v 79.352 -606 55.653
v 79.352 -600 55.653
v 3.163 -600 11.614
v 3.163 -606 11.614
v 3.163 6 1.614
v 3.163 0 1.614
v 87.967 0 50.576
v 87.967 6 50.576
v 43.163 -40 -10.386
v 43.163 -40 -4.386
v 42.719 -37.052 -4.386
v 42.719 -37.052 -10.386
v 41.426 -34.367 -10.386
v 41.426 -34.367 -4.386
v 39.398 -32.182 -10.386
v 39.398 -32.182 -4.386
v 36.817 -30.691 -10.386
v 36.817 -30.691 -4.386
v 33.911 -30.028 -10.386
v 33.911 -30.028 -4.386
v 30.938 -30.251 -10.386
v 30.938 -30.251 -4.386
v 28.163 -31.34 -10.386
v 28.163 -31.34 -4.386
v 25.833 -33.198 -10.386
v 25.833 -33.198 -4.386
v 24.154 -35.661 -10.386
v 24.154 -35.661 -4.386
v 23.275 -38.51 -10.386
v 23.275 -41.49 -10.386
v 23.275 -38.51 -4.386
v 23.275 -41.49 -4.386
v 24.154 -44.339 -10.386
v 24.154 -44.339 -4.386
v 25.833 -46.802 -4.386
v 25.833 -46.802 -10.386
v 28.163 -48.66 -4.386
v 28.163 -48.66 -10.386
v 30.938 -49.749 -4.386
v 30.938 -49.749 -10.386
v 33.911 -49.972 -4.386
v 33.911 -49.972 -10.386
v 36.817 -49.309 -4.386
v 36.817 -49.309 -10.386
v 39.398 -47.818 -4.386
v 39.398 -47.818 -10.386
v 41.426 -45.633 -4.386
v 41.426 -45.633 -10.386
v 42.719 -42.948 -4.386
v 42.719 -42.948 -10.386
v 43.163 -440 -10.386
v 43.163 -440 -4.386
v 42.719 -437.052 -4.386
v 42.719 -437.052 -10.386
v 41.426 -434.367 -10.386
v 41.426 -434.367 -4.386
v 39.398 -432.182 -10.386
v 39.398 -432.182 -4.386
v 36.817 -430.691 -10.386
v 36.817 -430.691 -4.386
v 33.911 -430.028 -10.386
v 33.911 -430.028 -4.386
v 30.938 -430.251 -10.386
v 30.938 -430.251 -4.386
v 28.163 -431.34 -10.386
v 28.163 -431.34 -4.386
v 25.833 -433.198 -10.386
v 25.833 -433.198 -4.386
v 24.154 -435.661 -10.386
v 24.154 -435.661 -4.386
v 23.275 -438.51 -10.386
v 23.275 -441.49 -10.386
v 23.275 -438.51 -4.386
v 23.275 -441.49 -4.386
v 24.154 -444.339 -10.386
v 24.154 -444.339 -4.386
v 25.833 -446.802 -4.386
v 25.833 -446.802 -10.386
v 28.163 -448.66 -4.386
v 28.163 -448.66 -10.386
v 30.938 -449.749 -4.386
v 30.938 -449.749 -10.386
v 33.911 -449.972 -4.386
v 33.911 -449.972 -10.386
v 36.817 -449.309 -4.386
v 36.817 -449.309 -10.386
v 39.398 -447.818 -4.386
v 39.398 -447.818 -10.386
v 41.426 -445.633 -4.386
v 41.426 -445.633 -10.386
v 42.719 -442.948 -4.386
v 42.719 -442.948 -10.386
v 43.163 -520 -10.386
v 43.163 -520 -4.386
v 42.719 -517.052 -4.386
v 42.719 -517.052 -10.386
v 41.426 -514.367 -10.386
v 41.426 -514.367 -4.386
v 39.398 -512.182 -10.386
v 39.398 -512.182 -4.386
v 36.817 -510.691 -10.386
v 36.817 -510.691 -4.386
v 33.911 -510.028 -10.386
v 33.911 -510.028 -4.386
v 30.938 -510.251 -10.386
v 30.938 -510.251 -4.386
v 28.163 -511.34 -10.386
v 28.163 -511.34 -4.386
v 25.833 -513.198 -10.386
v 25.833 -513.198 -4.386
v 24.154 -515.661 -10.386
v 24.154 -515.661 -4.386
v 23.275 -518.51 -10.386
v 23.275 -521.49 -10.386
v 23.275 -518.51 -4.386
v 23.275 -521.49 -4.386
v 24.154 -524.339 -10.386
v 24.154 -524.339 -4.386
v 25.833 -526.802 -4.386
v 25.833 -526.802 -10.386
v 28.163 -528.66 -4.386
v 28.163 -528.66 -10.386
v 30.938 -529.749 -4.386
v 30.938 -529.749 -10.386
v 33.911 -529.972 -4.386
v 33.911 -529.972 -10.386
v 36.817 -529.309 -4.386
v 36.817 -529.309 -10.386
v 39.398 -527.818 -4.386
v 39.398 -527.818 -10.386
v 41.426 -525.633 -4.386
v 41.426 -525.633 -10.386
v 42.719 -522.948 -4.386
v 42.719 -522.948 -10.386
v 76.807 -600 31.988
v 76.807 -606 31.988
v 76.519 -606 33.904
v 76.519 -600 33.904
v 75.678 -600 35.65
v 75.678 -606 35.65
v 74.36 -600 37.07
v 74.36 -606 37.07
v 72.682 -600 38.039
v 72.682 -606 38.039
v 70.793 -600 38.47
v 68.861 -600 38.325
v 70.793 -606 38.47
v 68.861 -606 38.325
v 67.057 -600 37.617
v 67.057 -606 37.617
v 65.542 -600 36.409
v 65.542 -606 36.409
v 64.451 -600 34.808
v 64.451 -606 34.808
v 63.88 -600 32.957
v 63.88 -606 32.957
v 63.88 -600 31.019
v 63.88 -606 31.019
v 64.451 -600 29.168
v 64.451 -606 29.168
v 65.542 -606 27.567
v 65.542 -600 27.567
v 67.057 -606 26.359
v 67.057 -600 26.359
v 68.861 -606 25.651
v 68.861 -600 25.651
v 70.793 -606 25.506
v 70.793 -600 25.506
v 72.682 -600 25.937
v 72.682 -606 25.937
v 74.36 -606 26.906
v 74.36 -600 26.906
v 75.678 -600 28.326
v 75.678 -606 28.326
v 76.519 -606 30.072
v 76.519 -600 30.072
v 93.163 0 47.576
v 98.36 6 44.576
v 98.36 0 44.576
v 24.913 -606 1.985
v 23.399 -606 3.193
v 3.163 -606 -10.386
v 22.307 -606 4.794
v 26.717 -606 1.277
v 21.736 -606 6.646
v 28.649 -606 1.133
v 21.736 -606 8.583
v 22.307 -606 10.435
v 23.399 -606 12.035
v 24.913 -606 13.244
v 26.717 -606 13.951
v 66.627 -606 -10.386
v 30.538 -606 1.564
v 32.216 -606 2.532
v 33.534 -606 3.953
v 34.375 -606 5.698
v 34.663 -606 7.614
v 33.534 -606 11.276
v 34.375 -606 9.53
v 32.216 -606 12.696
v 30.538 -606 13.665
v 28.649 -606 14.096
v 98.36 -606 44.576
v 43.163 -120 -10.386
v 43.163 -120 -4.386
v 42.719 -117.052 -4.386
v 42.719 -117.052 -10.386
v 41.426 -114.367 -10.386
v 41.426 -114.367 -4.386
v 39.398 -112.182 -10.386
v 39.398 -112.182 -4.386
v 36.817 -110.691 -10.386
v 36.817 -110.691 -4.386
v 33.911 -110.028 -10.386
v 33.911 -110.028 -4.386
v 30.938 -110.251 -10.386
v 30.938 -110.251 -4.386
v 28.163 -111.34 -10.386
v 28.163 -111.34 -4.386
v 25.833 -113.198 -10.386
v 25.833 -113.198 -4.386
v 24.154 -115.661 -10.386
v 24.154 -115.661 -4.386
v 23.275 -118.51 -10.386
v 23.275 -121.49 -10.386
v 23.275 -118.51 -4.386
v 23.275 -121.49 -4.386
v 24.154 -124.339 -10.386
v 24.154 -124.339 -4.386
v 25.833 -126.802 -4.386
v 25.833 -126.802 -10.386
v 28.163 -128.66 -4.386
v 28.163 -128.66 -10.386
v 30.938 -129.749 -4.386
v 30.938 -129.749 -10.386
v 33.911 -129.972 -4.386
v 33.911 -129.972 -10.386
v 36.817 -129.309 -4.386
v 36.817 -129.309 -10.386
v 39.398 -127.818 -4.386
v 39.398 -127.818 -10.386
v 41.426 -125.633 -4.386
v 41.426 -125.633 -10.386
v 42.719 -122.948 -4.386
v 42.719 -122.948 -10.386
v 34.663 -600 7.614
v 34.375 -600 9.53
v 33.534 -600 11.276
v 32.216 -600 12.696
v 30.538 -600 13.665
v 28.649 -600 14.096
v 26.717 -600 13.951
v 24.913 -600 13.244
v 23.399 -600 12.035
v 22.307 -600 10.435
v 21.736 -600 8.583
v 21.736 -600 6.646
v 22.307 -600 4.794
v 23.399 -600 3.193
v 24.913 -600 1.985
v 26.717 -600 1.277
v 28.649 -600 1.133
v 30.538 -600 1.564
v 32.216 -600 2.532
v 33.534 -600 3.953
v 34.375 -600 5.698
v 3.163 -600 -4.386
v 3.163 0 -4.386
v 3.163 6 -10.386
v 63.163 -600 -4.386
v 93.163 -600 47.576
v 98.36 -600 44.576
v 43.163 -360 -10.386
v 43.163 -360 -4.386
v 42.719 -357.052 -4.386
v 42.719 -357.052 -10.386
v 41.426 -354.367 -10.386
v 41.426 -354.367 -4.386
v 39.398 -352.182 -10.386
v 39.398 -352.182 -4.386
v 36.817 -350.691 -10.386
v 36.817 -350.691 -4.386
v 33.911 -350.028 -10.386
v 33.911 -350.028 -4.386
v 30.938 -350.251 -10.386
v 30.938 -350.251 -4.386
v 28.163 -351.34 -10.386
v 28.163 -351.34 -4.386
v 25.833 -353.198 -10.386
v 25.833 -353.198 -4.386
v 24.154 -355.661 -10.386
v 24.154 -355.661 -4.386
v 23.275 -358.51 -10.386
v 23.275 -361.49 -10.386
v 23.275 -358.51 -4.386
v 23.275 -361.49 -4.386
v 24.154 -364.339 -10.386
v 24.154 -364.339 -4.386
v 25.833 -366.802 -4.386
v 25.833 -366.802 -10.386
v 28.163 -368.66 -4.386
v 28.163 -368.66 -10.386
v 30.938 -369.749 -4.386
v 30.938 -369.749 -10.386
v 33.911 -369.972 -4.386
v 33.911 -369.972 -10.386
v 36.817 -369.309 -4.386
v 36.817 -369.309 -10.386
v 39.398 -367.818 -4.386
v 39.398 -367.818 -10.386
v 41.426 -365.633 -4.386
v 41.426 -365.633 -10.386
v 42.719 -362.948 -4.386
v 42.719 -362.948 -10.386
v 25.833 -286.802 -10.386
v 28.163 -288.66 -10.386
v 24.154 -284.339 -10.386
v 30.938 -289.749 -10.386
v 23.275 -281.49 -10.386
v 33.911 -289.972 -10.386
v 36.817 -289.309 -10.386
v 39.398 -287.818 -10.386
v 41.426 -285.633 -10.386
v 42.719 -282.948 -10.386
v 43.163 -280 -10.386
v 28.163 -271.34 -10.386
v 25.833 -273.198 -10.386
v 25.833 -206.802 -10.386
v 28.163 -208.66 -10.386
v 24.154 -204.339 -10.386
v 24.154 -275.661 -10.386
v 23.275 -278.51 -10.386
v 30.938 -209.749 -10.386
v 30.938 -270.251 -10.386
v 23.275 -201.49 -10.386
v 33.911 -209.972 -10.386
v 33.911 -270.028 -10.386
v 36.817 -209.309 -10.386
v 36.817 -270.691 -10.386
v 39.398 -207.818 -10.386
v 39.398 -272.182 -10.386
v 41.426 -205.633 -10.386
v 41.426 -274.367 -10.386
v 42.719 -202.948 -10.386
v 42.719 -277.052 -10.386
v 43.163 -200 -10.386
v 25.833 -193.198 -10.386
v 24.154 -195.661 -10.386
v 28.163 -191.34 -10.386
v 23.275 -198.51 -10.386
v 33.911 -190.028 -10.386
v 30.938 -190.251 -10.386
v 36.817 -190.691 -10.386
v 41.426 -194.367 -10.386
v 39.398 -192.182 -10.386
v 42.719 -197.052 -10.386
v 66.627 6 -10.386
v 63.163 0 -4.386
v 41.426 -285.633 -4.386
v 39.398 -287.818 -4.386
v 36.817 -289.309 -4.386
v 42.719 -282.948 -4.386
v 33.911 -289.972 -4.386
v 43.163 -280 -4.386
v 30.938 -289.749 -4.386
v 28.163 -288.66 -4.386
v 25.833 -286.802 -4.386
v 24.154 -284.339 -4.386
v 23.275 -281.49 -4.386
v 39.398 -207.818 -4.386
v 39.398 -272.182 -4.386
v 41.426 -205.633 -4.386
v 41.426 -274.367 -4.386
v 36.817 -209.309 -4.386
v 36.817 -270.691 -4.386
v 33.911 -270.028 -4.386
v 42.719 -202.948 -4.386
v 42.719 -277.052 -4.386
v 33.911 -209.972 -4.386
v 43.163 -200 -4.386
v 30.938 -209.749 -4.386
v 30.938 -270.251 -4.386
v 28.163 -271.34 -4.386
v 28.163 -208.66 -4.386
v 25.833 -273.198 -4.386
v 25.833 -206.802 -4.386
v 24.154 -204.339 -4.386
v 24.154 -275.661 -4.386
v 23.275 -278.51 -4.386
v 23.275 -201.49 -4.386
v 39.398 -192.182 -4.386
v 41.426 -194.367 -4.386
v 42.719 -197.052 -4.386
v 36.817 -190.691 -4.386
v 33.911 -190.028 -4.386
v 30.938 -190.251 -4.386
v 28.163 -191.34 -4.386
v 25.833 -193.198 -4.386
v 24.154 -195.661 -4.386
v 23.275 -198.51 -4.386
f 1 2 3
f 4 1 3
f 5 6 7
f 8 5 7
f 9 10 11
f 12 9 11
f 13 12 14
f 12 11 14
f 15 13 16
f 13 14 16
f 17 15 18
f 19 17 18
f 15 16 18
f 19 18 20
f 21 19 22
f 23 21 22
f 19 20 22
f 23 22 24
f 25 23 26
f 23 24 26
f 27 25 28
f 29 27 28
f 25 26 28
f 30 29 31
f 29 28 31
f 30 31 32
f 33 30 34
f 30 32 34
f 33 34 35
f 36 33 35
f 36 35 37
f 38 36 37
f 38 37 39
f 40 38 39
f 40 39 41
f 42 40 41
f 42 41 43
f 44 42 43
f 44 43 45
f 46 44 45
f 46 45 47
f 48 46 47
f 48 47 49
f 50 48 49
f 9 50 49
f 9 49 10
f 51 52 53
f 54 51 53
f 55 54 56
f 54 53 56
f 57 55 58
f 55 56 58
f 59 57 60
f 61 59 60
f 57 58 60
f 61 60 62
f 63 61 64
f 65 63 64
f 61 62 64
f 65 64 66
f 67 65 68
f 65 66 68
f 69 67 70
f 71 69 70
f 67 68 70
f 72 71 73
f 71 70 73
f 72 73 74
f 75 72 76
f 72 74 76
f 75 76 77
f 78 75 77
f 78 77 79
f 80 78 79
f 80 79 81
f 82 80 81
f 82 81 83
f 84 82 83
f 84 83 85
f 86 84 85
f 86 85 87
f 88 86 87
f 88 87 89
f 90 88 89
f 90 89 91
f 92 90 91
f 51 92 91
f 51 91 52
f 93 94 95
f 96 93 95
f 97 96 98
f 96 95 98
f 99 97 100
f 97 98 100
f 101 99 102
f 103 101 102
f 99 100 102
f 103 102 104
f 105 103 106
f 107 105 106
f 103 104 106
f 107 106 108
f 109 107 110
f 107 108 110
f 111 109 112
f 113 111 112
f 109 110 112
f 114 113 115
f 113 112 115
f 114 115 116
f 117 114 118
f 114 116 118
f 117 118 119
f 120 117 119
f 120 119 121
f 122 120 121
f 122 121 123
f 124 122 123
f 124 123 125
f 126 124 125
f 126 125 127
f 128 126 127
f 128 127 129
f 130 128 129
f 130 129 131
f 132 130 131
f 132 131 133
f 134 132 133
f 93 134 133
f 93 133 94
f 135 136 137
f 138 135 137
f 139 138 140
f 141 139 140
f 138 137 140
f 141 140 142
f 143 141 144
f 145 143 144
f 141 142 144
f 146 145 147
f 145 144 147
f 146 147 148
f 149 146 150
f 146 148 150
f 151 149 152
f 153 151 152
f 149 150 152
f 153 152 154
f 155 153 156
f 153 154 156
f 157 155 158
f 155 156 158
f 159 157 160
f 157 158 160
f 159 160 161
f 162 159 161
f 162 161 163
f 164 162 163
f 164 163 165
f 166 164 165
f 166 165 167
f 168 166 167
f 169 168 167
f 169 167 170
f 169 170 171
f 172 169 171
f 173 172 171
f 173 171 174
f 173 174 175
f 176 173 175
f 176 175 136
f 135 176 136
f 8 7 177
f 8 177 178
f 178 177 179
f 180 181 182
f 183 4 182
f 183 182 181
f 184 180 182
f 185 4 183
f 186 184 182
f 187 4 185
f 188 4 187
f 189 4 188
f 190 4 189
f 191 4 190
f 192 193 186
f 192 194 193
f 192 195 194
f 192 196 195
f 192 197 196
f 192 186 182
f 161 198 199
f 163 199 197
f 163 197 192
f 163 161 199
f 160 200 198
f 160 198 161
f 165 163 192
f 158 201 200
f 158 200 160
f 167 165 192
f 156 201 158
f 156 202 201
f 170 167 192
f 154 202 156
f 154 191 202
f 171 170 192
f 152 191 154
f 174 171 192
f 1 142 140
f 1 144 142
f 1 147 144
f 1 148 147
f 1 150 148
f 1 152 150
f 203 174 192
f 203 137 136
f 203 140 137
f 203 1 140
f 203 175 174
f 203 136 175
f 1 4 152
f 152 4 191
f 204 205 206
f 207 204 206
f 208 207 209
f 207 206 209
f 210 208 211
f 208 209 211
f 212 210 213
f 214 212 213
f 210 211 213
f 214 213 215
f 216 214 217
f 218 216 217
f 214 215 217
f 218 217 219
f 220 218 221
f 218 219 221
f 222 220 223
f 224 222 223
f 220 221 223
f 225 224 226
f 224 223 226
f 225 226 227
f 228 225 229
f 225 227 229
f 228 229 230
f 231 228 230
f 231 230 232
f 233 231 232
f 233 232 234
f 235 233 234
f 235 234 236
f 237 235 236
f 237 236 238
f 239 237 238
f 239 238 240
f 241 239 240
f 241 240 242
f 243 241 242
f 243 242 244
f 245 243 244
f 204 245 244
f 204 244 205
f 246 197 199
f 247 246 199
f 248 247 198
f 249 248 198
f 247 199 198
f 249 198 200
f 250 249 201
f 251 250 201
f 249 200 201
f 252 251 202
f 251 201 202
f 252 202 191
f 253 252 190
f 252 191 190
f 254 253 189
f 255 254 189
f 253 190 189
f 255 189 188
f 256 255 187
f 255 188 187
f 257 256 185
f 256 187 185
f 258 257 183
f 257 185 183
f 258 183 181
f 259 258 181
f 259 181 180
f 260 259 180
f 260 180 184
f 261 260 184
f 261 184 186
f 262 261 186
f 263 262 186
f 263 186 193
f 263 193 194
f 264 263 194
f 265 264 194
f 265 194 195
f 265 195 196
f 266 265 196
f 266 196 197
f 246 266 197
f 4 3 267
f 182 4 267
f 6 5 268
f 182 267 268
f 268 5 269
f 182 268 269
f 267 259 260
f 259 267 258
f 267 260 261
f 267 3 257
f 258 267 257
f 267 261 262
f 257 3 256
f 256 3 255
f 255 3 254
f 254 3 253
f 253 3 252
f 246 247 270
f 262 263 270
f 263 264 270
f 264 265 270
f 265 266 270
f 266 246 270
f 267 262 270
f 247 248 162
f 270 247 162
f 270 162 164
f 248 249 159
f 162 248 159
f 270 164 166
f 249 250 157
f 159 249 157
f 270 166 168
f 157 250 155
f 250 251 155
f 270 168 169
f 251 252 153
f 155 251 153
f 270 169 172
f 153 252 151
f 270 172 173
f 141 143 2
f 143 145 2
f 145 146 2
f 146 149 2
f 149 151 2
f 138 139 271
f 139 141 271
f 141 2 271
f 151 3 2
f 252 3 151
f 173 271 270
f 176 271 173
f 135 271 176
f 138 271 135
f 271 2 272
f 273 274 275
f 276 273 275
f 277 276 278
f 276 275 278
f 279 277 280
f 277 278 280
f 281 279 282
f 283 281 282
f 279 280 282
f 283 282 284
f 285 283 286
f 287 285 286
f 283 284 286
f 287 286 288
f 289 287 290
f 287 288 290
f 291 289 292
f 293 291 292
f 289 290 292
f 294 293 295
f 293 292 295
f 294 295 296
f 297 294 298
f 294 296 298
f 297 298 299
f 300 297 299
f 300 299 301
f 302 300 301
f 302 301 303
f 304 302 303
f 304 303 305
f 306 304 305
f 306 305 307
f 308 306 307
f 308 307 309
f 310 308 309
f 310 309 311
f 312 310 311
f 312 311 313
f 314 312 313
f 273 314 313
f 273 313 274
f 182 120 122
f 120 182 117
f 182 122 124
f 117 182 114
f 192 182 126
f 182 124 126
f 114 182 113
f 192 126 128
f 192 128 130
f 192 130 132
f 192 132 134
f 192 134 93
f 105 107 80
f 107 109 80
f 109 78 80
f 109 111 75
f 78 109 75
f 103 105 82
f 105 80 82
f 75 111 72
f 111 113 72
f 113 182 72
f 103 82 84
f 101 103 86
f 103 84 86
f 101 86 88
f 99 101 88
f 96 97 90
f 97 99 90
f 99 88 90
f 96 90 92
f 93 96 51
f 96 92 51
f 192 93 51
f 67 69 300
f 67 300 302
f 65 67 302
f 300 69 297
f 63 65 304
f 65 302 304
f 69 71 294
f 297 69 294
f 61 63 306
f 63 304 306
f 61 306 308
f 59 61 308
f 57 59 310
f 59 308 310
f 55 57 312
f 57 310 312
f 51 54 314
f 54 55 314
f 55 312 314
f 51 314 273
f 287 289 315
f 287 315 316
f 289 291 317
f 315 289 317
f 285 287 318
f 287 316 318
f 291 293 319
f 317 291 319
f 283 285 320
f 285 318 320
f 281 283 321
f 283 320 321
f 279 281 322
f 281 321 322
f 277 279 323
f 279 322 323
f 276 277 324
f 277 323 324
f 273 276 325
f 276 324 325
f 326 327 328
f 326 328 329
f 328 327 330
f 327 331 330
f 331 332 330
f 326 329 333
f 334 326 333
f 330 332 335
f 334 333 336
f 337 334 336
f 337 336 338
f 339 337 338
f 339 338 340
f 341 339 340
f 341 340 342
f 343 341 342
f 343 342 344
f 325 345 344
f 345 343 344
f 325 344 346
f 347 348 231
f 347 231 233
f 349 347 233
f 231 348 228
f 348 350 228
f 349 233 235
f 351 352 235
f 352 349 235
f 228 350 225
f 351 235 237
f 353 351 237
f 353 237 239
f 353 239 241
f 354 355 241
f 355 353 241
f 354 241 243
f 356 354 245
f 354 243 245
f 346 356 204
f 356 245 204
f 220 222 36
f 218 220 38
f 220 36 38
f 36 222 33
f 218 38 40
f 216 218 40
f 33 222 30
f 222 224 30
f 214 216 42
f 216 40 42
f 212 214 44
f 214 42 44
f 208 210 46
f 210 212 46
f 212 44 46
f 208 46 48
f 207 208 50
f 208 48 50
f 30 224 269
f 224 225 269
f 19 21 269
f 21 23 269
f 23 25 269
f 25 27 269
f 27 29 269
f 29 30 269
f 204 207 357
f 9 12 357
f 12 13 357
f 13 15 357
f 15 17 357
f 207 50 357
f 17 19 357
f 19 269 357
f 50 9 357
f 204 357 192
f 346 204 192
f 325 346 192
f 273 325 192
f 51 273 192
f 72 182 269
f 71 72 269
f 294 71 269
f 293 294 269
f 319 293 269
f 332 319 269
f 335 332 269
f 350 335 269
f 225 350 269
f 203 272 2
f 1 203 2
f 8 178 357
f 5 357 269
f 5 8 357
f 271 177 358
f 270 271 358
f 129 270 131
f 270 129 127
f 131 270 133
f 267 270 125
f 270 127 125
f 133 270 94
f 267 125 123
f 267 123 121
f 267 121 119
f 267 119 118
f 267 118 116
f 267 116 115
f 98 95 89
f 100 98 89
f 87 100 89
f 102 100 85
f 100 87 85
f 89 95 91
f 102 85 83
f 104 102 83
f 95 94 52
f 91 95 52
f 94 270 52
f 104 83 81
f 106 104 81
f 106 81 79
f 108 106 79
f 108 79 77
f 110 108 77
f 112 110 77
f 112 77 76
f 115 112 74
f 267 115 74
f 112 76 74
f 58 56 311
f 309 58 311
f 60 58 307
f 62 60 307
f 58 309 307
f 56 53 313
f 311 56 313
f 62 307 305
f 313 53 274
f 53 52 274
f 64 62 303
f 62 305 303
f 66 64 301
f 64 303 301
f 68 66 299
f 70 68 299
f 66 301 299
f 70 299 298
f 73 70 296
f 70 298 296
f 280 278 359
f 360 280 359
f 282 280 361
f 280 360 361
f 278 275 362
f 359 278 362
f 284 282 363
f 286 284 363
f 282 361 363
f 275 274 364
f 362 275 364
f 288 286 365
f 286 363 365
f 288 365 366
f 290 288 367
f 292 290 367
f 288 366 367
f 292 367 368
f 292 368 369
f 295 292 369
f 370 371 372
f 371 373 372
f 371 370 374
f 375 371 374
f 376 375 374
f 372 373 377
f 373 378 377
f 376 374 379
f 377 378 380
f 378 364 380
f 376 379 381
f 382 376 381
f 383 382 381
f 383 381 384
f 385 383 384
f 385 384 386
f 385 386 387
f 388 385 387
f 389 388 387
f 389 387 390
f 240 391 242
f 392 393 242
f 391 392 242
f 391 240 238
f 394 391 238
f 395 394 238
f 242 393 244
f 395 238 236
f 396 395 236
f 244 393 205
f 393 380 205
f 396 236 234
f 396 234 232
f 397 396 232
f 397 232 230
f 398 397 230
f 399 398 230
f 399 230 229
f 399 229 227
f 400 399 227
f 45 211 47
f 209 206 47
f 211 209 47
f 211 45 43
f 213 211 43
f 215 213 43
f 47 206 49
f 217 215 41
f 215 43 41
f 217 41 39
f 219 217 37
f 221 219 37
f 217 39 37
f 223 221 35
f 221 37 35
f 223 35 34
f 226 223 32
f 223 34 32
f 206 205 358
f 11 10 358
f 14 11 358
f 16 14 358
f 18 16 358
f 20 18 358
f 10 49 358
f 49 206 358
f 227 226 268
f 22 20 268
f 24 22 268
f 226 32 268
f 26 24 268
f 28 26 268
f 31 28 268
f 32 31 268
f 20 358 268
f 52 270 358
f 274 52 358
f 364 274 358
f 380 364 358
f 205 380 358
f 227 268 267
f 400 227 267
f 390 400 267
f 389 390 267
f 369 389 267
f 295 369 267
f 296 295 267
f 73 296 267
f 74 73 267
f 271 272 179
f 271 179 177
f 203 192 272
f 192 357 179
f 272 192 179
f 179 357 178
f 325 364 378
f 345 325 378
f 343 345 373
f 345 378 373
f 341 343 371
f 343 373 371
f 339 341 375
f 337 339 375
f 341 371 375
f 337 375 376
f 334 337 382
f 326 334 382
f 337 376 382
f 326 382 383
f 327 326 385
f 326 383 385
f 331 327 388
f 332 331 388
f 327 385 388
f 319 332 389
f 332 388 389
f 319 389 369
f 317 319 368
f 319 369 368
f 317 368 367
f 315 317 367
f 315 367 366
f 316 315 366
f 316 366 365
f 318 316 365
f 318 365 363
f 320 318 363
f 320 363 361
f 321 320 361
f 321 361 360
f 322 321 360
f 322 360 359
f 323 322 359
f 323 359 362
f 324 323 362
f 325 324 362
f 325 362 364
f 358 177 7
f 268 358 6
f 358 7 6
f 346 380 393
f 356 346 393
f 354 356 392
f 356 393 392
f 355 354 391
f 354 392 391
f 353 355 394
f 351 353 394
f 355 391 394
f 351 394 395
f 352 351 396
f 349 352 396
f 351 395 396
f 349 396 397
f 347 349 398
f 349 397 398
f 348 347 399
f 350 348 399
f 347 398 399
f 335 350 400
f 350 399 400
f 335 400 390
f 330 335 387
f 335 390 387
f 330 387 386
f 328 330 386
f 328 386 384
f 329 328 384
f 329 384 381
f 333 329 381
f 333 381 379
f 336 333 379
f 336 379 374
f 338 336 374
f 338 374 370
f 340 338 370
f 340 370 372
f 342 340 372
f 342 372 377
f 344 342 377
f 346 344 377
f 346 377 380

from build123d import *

# Parameters (mm, degrees)
F1_DEPTH = 600
F4_DEPTH = 6
F6_DEPTH = 6
F7_R     = 6.5
F8_DEPTH = 25
F3_R     = 10
F9_DEPTH = 25


with BuildPart() as f1:
    # F0 (on Front) → F1 (new body)
    with BuildSketch(Plane.XZ):
        Polygon((3.163387, -4.385628), (3.163387, -10.385628), (66.627489, -10.385628), (98.35954, 44.575896), (93.163387, 47.575896), (63.163387, -4.385628), align=None)
    extrude(amount=F1_DEPTH)

    # F2 (on face) → F4 (join)
    with BuildSketch(Plane(origin=(0, 0, 0), x_dir=(-1, 0, 0), z_dir=(0, 1, 0))):
        Polygon((-3.163387, -10.385628), (-3.163387, 1.614372), (-87.967235, 50.575896), (-98.35954, 44.575896), (-66.627489, -10.385628), align=None)
    extrude(amount=F4_DEPTH)

    # F5 (on face) → F6 (join)
    with BuildSketch(Plane.XZ.offset(600)):
        Polygon((3.163387, 11.614372), (3.163387, -10.385628), (66.627489, -10.385628), (98.35954, 44.575896), (79.351506, 55.652657), align=None)
    extrude(amount=F6_DEPTH)

    # F7 (on face) → F8 (cut)
    with BuildSketch(Plane.XZ.offset(606)):
        with Locations((70.307284, 31.987963)):
            Circle(F7_R)
        with Locations((28.163387, 7.614372)):
            Circle(F7_R)
    extrude(amount=-F8_DEPTH, mode=Mode.SUBTRACT)

    # F3 (on face) → F9 (cut)
    with BuildSketch(Plane.XY.offset(-4.385628)):
        with Locations((33.163387, -40)):
            Circle(F3_R)
        with Locations((33.163387, -120)):
            Circle(F3_R)
        with Locations((33.163387, -200)):
            Circle(F3_R)
        with Locations((33.163387, -280)):
            Circle(F3_R)
        with Locations((33.163387, -360)):
            Circle(F3_R)
        with Locations((33.163387, -440)):
            Circle(F3_R)
        with Locations((33.163387, -520)):
            Circle(F3_R)
    extrude(amount=-F9_DEPTH, mode=Mode.SUBTRACT)


solid = f1.part
